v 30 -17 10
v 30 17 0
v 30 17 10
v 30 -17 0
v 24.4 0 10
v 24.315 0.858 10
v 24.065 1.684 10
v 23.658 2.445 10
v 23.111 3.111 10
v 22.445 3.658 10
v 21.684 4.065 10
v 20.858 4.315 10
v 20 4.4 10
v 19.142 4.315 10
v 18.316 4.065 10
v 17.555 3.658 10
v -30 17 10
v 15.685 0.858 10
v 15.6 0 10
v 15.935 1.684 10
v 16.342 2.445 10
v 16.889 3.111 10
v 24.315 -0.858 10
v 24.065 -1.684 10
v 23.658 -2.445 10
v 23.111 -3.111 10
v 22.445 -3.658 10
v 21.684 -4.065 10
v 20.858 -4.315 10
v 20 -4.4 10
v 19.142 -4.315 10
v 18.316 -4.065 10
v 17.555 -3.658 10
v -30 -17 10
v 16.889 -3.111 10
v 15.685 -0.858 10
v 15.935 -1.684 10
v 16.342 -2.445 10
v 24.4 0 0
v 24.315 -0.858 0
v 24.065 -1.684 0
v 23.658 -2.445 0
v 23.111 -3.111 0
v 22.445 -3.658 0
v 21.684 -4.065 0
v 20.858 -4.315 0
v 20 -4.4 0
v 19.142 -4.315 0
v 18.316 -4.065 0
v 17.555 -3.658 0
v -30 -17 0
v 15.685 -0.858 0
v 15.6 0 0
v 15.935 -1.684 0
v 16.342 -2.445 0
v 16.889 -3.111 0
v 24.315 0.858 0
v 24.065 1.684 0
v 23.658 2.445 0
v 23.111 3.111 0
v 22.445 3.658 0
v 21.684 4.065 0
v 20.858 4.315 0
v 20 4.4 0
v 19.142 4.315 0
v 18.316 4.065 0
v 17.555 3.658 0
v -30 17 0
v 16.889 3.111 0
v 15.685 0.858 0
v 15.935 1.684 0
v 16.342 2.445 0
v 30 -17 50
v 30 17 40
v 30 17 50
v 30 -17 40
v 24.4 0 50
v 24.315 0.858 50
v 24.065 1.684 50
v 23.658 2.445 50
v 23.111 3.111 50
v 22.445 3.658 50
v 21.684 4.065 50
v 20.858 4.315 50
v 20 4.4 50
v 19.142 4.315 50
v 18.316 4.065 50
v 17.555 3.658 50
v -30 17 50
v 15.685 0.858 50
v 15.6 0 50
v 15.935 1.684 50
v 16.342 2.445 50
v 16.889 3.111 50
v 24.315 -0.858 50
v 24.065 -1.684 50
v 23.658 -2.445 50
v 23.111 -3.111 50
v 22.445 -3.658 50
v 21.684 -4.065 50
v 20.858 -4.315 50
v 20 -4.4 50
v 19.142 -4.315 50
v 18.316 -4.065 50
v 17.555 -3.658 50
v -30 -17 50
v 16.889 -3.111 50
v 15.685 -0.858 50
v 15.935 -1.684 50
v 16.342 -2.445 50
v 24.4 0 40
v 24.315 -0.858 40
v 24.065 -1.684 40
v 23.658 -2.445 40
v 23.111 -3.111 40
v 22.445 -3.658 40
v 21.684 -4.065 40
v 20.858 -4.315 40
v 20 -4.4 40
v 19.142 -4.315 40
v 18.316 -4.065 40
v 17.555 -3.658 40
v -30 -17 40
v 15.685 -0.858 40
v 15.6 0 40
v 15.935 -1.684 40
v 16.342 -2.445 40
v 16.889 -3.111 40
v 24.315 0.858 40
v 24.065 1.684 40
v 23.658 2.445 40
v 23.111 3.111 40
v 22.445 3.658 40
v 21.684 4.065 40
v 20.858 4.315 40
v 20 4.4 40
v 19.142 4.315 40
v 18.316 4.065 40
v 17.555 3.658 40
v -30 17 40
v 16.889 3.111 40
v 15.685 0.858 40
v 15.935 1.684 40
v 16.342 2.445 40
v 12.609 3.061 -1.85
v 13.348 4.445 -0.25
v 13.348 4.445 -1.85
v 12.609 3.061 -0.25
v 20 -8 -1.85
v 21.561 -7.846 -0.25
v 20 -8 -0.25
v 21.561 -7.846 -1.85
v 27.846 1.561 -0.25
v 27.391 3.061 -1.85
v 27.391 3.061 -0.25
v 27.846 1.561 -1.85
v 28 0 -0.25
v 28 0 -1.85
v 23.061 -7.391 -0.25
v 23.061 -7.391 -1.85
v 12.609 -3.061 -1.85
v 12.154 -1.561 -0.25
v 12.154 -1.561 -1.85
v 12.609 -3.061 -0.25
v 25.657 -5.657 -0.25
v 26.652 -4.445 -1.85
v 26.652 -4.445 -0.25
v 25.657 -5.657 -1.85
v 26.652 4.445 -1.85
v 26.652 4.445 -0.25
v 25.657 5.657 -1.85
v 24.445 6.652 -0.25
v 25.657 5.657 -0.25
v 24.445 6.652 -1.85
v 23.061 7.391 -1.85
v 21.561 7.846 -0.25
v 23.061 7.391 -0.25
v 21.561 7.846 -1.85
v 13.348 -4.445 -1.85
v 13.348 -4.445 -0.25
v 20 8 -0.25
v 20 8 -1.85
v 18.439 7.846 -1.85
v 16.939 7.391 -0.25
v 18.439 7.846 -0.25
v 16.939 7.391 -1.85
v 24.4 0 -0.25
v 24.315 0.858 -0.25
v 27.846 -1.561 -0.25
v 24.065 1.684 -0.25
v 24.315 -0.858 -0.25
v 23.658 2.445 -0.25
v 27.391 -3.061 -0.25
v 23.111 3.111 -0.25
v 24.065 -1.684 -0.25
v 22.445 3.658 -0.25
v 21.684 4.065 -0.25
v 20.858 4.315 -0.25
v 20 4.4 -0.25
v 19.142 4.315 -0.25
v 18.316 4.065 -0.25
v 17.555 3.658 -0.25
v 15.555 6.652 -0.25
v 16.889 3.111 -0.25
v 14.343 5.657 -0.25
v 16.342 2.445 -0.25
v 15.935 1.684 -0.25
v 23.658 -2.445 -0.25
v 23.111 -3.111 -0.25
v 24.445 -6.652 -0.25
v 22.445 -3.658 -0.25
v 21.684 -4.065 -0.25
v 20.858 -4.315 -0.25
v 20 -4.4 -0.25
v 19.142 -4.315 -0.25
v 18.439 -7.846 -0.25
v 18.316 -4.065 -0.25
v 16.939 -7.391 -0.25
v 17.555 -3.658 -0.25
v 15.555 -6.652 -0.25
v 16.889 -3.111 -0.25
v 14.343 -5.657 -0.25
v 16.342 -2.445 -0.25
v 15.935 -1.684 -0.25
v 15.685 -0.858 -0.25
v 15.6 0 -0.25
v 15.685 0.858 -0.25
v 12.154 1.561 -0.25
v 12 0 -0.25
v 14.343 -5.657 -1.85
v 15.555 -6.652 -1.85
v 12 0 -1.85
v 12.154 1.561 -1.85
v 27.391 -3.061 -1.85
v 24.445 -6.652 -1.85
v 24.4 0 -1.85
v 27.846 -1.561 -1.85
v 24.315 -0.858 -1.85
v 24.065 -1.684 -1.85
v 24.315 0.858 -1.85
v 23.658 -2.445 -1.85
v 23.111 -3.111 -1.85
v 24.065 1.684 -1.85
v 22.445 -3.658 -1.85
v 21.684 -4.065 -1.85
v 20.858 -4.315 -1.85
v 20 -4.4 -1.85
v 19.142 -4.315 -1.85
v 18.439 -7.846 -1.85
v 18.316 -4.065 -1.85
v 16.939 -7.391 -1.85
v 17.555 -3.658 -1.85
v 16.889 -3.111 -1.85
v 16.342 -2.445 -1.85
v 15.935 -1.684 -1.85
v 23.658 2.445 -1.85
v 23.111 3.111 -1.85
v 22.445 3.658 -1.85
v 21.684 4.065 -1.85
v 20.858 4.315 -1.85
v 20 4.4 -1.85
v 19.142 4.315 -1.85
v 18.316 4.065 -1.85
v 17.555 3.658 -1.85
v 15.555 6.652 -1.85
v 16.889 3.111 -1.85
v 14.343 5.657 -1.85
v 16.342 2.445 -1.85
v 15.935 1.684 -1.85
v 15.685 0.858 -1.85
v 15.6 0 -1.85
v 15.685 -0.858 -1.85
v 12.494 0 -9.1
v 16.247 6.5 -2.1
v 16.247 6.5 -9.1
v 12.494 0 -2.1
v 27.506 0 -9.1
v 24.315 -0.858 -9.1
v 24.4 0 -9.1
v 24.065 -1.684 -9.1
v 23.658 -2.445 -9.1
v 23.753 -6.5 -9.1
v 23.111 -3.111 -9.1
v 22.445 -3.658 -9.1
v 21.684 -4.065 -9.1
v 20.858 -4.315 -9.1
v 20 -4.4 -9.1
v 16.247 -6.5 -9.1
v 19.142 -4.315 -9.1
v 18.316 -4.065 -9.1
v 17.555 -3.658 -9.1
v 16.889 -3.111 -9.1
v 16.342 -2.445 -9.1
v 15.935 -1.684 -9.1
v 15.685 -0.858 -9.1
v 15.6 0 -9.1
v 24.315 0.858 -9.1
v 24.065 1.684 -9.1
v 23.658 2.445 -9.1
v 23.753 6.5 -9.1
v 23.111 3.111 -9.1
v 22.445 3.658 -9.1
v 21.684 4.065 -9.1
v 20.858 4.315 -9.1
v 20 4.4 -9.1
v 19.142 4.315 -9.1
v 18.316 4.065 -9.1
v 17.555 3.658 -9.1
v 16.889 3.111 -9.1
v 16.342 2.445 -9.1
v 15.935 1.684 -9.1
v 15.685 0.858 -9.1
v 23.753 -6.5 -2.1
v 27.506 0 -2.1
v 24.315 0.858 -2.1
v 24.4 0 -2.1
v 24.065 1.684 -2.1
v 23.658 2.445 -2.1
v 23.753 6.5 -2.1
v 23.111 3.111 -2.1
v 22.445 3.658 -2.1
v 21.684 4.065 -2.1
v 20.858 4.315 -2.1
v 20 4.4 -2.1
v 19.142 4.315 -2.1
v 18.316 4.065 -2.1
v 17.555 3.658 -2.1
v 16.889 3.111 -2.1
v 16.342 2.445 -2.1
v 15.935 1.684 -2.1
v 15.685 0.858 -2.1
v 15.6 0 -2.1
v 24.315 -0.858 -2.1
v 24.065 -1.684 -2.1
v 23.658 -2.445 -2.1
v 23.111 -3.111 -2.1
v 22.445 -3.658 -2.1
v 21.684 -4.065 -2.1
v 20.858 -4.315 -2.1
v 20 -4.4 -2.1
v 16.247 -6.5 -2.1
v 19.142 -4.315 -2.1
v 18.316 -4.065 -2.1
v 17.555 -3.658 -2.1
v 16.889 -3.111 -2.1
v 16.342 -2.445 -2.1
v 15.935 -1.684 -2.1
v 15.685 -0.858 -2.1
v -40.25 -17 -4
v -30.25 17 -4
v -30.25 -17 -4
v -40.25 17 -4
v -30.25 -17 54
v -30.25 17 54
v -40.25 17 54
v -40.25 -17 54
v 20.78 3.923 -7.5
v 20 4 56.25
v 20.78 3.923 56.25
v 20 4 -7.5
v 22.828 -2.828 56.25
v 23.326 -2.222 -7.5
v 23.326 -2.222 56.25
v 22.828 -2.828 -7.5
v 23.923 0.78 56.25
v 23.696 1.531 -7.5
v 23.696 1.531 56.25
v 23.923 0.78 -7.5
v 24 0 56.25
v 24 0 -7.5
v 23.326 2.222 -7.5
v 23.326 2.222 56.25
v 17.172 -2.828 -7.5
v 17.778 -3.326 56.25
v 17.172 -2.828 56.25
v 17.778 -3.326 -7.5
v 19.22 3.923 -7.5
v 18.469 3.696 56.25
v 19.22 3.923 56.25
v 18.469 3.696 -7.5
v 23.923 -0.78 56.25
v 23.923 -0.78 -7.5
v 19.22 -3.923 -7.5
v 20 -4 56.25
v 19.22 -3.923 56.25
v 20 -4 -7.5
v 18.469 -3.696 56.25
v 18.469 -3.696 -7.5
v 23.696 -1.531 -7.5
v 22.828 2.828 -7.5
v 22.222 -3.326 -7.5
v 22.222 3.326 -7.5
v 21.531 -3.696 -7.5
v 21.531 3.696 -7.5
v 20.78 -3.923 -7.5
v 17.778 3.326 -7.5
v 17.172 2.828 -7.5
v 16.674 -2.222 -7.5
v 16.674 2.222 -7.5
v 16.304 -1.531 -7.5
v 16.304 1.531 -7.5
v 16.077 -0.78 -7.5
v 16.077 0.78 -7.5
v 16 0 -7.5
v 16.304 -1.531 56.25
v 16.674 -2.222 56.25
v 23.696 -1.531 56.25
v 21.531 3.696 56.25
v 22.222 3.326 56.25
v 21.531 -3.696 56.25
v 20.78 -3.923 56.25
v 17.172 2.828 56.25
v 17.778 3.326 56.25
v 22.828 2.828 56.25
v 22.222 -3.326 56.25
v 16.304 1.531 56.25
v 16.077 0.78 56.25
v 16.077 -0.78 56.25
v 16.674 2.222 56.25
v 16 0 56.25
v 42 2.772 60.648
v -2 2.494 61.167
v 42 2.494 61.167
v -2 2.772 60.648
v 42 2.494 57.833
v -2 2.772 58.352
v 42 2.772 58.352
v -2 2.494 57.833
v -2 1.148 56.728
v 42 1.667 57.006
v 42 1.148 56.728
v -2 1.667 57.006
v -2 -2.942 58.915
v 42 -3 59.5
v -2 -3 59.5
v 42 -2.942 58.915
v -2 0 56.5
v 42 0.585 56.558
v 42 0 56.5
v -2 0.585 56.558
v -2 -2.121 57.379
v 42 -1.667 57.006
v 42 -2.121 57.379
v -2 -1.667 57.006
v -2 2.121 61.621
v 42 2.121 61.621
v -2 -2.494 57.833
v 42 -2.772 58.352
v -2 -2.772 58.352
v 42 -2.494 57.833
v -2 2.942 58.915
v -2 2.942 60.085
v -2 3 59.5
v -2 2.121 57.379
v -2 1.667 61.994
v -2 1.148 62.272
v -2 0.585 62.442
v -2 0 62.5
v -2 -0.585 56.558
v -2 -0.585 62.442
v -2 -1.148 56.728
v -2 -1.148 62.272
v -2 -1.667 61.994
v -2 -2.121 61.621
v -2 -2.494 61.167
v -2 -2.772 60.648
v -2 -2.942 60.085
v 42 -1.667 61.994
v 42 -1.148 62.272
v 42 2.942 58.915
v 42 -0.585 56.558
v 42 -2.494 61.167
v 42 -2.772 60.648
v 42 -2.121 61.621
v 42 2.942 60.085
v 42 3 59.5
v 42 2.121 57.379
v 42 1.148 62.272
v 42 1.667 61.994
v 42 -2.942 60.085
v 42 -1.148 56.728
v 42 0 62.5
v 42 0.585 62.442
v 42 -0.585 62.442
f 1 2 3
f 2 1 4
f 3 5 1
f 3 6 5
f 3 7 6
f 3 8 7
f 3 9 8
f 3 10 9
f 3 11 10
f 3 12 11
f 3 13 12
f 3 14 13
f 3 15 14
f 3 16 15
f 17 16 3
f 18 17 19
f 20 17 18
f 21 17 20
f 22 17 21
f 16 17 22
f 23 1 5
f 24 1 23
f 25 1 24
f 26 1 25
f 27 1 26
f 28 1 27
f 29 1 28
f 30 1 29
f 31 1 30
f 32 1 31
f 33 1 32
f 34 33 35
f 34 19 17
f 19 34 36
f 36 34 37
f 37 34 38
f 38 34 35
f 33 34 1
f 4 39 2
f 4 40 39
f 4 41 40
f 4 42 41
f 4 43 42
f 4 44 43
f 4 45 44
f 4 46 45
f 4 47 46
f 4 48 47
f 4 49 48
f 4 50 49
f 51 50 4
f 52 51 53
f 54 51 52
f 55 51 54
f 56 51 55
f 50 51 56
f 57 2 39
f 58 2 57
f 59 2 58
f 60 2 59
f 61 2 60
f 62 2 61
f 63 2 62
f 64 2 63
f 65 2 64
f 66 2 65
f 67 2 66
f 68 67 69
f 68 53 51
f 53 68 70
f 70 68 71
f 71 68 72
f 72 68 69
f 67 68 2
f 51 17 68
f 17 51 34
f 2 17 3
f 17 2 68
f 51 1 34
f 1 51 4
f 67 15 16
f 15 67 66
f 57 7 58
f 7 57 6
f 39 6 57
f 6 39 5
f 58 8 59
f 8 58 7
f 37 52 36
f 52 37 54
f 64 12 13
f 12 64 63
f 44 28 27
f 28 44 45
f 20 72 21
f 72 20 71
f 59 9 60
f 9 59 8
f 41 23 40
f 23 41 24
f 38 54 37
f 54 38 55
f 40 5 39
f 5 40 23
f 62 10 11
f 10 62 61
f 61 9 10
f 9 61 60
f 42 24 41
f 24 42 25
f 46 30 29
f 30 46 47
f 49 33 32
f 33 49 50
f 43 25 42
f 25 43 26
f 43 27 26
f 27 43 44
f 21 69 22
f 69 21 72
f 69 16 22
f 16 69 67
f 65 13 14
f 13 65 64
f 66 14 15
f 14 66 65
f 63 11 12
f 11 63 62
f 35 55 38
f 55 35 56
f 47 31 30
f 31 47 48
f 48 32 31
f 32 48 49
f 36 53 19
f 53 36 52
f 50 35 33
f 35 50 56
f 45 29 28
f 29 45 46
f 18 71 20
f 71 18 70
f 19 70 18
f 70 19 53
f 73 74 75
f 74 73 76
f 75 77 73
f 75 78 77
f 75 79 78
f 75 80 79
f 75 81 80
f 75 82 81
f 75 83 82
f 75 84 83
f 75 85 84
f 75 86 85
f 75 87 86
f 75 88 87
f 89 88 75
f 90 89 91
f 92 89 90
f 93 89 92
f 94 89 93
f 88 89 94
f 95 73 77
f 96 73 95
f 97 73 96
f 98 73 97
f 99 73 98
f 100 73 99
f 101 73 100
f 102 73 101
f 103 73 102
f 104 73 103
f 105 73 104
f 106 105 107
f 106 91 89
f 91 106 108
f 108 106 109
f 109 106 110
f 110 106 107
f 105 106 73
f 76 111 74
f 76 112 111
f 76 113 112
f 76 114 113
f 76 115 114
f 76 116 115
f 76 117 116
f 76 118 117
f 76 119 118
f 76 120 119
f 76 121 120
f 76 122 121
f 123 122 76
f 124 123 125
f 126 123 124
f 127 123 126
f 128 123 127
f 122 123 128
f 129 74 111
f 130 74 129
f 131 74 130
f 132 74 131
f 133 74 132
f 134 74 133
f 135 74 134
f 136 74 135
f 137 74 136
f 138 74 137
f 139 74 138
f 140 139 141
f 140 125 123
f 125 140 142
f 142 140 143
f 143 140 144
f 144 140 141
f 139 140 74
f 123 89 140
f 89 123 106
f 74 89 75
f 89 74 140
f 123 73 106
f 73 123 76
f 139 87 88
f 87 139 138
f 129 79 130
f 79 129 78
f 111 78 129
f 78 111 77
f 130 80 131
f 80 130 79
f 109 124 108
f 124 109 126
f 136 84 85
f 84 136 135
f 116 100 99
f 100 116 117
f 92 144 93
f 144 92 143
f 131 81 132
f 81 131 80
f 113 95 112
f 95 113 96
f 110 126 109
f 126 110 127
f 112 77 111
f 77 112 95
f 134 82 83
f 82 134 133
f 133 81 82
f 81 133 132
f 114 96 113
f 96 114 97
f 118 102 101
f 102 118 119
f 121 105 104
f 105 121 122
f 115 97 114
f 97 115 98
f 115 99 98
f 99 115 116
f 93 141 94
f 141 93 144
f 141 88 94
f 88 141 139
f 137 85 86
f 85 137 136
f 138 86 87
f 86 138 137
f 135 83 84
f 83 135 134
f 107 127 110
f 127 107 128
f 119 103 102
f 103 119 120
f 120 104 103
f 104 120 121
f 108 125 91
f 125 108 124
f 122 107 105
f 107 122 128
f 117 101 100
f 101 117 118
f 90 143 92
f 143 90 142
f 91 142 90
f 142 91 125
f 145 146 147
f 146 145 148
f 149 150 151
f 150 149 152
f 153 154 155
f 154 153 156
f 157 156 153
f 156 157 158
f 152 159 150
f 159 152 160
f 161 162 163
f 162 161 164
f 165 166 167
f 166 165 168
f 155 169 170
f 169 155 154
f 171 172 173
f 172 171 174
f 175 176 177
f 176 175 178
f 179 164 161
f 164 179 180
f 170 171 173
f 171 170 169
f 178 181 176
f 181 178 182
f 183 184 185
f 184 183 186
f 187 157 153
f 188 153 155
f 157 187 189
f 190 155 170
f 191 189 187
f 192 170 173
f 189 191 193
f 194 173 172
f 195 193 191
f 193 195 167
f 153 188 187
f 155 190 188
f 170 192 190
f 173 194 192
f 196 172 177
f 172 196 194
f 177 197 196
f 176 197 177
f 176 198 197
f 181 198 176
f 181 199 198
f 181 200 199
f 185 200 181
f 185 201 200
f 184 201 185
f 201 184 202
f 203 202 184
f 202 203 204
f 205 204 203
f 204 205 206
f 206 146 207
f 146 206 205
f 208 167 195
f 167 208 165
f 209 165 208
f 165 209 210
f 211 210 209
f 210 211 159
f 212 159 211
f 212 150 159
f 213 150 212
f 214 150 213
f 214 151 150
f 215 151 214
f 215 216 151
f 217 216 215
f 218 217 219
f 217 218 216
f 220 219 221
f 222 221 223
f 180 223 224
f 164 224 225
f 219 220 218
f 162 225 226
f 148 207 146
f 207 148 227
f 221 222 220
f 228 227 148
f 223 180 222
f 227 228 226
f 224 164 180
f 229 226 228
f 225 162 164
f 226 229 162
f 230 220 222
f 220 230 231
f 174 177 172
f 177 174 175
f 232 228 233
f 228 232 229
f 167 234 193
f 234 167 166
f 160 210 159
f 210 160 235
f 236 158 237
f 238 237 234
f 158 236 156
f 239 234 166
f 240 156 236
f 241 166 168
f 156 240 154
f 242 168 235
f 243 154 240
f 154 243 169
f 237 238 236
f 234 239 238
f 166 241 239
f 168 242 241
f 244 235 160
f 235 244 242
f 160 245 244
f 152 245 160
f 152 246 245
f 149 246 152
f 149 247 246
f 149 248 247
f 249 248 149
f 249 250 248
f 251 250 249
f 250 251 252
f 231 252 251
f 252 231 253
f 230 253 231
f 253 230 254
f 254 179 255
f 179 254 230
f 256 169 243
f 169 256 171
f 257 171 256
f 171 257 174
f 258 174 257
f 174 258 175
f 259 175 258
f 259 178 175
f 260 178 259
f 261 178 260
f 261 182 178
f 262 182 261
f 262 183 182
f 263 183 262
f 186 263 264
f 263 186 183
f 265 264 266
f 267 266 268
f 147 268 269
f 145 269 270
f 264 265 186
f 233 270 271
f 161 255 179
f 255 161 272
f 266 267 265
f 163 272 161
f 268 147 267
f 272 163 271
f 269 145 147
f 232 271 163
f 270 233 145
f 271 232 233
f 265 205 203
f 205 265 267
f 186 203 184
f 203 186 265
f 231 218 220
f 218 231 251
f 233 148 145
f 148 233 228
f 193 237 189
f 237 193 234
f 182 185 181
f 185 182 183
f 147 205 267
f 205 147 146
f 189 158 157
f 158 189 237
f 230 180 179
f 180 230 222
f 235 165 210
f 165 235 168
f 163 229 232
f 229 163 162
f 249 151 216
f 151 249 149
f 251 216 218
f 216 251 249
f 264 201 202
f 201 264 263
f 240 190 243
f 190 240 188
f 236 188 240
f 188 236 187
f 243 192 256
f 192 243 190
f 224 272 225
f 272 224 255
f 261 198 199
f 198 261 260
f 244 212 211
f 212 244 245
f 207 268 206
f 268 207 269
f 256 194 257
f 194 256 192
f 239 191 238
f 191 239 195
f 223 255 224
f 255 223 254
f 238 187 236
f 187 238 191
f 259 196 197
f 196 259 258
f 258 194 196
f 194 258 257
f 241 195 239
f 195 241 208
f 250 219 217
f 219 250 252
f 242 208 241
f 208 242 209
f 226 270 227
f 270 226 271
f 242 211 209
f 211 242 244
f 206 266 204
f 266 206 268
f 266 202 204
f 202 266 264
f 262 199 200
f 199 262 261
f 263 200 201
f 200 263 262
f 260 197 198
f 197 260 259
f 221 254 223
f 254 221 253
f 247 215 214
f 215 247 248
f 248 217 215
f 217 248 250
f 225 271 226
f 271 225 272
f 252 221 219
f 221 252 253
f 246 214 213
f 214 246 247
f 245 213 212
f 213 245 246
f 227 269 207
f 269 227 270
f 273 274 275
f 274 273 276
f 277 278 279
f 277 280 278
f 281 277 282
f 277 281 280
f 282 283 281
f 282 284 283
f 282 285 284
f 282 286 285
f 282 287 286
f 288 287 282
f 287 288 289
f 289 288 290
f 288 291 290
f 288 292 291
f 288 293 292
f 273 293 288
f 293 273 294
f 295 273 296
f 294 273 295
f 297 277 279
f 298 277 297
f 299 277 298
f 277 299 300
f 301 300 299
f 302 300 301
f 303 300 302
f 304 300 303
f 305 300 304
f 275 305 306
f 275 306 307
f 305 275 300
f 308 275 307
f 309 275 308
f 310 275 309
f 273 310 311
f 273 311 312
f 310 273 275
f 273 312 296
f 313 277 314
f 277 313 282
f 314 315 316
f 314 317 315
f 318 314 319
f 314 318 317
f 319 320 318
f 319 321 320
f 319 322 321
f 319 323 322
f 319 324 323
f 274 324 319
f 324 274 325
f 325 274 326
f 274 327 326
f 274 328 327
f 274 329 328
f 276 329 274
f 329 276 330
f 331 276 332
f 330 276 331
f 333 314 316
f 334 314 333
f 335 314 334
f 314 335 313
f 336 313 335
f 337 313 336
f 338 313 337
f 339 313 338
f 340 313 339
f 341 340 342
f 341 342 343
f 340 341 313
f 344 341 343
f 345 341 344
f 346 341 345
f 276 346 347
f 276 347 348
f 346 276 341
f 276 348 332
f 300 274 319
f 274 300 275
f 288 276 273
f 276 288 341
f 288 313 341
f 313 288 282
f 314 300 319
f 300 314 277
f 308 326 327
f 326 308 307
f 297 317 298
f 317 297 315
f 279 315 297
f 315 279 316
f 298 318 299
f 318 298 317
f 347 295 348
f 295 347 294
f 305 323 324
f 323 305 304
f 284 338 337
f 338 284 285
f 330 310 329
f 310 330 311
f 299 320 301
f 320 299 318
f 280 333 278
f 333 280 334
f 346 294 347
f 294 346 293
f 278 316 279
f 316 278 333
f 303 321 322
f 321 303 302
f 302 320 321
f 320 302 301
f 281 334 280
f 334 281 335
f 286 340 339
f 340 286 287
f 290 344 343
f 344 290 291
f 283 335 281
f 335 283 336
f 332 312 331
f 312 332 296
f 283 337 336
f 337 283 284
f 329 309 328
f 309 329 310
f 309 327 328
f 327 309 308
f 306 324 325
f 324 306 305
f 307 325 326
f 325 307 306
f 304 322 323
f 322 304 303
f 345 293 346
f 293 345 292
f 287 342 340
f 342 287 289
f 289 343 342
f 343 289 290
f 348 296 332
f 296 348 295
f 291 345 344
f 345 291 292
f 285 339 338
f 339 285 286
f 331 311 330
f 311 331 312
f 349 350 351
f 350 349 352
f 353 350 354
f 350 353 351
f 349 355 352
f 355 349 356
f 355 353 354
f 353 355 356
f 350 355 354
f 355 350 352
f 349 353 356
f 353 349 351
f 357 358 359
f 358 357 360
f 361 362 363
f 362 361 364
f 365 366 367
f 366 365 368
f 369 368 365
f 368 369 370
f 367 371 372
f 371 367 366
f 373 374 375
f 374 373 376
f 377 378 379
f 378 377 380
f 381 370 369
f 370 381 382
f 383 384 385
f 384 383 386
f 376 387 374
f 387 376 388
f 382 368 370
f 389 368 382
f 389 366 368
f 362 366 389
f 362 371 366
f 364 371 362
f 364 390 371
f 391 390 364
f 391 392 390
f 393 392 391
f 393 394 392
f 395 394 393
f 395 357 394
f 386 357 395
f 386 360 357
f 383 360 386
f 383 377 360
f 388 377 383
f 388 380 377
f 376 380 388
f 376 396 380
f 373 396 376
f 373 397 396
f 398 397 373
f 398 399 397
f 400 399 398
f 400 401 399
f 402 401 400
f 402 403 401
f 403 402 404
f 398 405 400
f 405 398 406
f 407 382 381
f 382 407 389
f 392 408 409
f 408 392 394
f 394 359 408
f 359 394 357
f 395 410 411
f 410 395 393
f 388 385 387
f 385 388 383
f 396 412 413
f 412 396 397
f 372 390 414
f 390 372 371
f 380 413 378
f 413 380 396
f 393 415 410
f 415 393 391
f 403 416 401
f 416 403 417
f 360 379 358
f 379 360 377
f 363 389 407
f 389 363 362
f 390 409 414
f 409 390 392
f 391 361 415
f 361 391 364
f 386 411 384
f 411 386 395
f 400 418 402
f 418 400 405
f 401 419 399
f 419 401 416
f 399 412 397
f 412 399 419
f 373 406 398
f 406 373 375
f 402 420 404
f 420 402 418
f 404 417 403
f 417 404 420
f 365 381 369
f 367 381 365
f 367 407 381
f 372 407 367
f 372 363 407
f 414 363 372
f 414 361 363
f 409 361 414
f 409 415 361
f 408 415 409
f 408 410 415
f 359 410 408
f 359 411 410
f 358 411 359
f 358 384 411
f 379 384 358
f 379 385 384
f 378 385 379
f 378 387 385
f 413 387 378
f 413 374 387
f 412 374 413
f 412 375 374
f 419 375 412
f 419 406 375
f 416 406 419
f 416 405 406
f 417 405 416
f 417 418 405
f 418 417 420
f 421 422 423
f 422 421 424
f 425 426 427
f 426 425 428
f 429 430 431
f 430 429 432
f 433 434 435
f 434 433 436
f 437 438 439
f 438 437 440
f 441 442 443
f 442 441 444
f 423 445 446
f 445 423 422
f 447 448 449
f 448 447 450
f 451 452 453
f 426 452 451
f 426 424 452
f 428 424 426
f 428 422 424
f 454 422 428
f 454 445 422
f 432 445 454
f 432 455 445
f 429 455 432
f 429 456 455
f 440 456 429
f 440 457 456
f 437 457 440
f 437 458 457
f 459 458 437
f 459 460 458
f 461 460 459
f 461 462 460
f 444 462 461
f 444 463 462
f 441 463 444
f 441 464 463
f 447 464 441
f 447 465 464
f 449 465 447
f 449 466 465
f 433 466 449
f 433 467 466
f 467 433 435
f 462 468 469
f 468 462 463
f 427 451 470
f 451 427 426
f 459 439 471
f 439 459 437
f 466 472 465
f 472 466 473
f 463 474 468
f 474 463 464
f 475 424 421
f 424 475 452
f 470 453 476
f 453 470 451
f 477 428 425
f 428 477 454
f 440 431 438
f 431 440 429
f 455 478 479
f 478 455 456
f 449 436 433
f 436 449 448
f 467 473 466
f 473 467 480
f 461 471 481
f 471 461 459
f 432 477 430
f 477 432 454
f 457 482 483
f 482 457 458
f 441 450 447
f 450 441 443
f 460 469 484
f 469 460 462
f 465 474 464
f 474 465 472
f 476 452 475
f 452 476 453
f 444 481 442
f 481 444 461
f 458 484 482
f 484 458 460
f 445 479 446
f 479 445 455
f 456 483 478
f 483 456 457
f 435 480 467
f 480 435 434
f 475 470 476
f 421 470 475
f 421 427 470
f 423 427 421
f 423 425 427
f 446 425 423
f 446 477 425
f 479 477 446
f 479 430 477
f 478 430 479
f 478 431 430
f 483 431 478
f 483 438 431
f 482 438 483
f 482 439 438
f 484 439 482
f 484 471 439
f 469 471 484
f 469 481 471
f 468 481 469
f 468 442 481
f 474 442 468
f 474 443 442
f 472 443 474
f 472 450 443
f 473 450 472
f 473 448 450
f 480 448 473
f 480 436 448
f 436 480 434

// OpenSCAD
$fn = 32;

// ------------------------------------------------------------------------
// C clamp: throat 40 mm, screw d8
// Every part is its own module, assembly() places every instance.
// ------------------------------------------------------------------------

// --- part 1 ---
module clamp_arm() {
  difference() {
    translate([-30, -17, 0]) cube([60, 34, 10]);
    translate([20, 0, -1]) cylinder(h = 12, d = 8.8);
  }
}

// --- part 2 ---
module clamp_spine() {
  difference() {
    translate([-29, -17, 0]) cube([58, 34, 10]);
  }
}

// --- part 3 ---
module clamp_screw() {
  translate([0, 0, -31.875]) cylinder(h = 63.75, d = 8);
}

// --- part 4 ---
module clamp_washer() {
  difference() {
      translate([0, 0, 0]) cylinder(h = 1.6, d = 16);
      translate([0, 0, -1]) cylinder(h = 3.6, d = 8.8);
    }
}

// --- part 5 ---
module clamp_nut() {
  difference() {
    linear_extrude(height = 7) polygon(points = [[7.506, 0], [3.753, 6.5], [-3.753, 6.5], [-7.506, 0], [-3.753, -6.5], [3.753, -6.5]]);
    translate([0, 0, -1]) cylinder(h = 9, d = 8.8);
  }
}

// --- part 6 ---
module tommy_bar() {
  translate([0, 0, -22]) cylinder(h = 44, d = 6);
}

// --- assembly ---
module assembly() {
  color([0.80, 0.24, 0.20]) translate([0, 0, 0]) rotate([0, 0, 0]) clamp_arm();
  color([0.20, 0.45, 0.75]) translate([0, 0, 40]) rotate([0, 0, 0]) clamp_arm();
  color([0.25, 0.62, 0.32]) translate([-40.25, 0, 25]) rotate([0, 90, 0]) clamp_spine();
  color([0.92, 0.70, 0.18]) translate([20, 0, 24.375]) rotate([0, 0, 0]) clamp_screw();
  color([0.58, 0.35, 0.70]) translate([20, 0, -1.85]) rotate([0, 0, 0]) clamp_washer();
  color([0.16, 0.66, 0.66]) translate([20, 0, -9.1]) rotate([0, 0, 0]) clamp_nut();
  color([0.85, 0.48, 0.18]) translate([20, 0, 59.5]) rotate([0, 90, 0]) tommy_bar();
}

assembly();
